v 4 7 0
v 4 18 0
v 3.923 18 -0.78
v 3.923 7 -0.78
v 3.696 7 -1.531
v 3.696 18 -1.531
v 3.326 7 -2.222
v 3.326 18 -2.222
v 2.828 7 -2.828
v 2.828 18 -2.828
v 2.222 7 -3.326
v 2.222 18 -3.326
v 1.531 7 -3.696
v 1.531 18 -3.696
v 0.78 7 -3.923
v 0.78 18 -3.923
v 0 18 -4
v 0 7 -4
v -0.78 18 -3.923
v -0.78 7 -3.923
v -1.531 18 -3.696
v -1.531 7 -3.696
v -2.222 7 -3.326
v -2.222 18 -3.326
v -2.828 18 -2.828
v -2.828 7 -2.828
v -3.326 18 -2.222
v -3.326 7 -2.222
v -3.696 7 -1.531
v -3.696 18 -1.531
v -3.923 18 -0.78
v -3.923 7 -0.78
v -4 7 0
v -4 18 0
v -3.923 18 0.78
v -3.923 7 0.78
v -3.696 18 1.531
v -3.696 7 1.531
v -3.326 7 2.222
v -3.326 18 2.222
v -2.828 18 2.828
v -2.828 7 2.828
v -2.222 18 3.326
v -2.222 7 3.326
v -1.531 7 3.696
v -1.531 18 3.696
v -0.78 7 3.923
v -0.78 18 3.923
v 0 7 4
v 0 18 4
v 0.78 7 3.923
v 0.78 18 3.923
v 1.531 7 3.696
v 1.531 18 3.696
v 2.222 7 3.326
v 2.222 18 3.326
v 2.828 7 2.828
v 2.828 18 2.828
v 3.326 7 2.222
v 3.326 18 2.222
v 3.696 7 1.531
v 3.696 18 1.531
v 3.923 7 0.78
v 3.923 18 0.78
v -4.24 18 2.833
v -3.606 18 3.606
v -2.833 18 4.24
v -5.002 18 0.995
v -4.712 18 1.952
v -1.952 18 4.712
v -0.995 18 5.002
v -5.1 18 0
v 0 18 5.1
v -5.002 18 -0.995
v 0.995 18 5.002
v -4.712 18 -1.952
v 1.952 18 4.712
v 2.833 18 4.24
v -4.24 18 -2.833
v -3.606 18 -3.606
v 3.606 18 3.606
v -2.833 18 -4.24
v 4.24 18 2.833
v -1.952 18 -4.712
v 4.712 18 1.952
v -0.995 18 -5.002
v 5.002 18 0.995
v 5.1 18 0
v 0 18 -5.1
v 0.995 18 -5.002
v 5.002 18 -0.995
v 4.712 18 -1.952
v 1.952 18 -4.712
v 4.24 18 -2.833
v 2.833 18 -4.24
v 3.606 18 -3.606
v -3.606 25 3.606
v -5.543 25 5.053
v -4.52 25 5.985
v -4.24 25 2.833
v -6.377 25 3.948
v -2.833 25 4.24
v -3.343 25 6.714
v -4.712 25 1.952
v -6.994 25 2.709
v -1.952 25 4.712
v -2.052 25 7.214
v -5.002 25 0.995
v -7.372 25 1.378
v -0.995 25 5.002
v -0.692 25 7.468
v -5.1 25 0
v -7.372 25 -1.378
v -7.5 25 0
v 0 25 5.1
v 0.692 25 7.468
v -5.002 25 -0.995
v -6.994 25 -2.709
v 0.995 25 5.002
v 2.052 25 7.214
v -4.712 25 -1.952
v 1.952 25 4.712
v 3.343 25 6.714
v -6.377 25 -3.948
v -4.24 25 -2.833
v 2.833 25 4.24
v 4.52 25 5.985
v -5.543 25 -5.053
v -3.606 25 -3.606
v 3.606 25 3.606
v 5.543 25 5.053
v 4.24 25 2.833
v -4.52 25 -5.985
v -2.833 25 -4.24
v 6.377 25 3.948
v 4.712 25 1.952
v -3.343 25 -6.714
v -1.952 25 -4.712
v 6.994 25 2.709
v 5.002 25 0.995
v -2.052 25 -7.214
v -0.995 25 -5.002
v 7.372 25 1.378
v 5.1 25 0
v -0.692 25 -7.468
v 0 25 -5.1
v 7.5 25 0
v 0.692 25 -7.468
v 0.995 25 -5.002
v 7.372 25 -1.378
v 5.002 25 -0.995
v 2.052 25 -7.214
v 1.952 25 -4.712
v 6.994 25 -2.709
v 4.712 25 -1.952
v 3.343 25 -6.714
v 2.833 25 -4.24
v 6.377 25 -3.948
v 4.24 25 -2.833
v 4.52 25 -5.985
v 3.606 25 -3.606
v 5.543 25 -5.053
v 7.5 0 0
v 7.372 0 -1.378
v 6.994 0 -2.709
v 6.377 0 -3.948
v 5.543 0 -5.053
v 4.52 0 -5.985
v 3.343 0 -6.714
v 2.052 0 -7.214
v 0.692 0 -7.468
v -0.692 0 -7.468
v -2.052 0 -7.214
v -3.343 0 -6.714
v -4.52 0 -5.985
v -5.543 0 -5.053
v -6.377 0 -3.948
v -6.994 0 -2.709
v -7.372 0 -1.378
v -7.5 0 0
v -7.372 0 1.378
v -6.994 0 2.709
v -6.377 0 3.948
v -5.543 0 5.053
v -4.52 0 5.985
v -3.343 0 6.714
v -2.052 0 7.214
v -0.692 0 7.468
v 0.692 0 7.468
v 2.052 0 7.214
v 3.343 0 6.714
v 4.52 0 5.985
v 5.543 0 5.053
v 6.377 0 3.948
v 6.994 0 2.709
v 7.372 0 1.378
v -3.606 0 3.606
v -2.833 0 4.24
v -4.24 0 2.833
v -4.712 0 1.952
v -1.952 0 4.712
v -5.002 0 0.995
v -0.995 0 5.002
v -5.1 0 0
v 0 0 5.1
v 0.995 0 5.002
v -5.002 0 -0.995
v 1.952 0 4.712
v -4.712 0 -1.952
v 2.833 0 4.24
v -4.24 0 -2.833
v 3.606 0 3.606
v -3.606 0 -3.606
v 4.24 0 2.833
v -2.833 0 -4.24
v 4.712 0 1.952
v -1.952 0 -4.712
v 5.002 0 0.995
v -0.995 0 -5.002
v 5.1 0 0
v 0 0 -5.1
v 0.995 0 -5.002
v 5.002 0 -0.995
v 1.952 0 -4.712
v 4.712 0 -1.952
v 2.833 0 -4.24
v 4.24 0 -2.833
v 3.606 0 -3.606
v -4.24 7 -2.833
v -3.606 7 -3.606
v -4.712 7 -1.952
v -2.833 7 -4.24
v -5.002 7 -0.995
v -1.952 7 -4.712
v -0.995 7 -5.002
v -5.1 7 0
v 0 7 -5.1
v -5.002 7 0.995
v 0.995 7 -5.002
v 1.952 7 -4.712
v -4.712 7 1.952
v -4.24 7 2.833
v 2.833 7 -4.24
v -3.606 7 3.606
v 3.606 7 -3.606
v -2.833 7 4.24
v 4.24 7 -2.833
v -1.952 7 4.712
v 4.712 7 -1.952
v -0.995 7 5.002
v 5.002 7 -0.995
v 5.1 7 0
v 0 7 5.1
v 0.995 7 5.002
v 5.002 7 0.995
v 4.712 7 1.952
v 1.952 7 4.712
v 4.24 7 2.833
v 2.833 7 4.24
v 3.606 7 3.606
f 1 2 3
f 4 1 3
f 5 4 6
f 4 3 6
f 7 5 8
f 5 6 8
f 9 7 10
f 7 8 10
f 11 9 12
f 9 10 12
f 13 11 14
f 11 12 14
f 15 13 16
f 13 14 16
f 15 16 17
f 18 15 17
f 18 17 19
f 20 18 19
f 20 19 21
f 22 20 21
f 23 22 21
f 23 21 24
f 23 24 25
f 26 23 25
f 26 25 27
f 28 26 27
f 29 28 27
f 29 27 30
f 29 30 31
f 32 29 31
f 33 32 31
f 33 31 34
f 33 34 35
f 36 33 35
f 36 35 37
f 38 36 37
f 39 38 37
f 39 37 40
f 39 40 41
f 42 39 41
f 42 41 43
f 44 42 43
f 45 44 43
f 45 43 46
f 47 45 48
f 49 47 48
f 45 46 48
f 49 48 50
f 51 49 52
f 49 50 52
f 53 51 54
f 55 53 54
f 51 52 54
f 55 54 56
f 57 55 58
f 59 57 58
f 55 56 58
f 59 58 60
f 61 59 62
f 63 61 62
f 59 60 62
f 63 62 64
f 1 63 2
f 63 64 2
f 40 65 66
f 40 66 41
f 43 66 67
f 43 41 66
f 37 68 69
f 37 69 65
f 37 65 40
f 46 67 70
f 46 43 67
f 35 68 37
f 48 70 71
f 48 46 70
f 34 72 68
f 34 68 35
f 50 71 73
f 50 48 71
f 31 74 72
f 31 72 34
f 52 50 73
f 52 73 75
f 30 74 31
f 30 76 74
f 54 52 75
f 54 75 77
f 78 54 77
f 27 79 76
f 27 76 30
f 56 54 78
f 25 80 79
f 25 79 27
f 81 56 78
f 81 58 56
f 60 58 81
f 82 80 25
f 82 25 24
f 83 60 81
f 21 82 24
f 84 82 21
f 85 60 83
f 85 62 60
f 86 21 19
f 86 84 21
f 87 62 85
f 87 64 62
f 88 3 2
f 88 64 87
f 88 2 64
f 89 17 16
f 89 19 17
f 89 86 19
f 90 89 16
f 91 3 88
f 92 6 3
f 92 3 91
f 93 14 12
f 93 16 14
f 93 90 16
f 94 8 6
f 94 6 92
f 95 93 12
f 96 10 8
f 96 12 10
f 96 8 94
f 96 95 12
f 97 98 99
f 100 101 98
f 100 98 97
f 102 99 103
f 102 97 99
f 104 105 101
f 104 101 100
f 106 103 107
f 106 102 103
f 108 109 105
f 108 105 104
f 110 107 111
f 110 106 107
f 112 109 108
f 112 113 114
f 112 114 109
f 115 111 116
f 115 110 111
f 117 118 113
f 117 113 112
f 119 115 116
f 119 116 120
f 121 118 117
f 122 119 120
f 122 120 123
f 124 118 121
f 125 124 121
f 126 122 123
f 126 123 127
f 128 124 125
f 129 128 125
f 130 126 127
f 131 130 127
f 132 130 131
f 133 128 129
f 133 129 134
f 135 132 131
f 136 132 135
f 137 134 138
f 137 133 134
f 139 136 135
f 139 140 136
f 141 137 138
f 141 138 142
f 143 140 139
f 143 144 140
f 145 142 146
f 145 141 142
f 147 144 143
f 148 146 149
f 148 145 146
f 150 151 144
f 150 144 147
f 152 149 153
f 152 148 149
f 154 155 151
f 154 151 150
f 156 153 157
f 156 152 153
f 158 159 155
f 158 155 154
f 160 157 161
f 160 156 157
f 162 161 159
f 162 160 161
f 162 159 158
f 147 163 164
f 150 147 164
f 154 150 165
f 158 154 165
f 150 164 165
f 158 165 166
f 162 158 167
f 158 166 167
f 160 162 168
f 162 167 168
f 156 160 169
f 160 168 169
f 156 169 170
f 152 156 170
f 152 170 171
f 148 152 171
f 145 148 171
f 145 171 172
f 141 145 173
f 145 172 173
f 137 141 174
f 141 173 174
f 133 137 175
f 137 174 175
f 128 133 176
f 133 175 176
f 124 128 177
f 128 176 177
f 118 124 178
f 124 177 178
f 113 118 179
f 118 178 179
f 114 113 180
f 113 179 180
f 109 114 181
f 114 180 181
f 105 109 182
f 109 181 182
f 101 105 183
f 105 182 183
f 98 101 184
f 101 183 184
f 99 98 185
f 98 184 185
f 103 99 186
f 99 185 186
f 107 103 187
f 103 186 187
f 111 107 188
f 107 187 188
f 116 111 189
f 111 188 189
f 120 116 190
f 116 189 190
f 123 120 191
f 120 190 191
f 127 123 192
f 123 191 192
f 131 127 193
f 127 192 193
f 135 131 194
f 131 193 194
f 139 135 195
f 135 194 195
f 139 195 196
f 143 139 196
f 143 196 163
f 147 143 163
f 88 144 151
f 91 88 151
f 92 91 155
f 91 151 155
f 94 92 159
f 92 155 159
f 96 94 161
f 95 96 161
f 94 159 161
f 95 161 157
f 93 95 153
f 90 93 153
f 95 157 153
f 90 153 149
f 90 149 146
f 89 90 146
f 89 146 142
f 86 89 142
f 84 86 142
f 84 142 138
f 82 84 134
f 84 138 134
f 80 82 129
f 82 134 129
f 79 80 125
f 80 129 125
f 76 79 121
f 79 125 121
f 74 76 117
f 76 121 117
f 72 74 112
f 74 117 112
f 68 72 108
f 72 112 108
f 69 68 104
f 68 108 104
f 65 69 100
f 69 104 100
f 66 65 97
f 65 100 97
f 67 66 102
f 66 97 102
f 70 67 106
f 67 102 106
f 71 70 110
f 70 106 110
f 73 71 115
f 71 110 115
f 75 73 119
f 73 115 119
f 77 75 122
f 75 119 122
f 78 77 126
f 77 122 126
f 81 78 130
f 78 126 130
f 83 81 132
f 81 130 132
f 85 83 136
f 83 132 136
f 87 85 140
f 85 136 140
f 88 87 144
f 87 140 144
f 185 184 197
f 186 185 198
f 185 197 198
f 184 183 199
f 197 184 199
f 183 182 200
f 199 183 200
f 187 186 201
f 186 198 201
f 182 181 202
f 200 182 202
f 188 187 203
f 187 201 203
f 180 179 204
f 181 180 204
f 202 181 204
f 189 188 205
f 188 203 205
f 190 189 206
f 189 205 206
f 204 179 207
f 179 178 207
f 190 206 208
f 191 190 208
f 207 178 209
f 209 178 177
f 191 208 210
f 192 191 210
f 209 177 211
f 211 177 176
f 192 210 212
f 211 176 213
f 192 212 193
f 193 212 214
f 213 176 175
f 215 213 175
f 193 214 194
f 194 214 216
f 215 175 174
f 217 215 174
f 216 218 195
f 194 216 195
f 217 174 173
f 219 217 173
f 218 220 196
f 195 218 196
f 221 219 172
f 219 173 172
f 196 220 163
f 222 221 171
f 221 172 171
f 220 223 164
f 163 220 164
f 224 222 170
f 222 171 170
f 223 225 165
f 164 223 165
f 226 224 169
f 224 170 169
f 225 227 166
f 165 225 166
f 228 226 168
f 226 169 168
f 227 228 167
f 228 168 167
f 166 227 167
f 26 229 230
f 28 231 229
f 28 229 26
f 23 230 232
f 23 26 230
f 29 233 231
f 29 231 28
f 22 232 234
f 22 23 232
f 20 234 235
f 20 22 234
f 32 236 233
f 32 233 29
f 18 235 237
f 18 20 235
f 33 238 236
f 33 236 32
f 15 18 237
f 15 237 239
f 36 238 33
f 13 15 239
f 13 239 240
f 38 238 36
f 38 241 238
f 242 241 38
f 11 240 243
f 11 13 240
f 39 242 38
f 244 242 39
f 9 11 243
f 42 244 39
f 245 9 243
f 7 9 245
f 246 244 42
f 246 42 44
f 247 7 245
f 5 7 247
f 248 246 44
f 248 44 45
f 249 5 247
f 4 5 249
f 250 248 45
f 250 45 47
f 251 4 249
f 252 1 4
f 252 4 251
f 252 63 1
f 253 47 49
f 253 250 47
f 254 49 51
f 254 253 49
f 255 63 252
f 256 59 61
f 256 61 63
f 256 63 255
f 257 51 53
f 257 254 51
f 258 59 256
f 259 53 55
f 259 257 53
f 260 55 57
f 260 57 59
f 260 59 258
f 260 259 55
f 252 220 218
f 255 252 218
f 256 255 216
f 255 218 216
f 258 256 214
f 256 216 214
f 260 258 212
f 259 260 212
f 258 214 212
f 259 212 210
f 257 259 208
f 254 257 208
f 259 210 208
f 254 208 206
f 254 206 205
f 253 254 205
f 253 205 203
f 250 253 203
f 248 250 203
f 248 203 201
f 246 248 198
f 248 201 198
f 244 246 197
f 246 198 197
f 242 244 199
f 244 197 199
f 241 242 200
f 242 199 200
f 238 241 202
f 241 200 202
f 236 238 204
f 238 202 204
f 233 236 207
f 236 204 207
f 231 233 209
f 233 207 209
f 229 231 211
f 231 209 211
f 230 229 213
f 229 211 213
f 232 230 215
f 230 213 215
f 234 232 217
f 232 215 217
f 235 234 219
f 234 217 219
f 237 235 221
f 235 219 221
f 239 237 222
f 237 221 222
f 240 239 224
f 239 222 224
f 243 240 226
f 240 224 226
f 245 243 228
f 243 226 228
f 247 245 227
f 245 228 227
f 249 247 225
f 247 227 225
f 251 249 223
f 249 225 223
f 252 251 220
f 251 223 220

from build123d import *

# Parameters (mm, degrees)
SKETCH1_R           = 7.5
BOSS_EXTRUDE1_DEPTH = 25
SKETCH2_R           = 5.1
CUT_EXTRUDE1_DEPTH  = 7
SKETCH3_R           = 5.1
CUT_EXTRUDE2_DEPTH  = 7
SKETCH4_R           = 4
CUT_EXTRUDE3_DEPTH  = 19


with BuildPart() as part:
    # Sketch1 → Boss-Extrude1 (new body)
    with BuildSketch(Plane(origin=(0, 0, 0), x_dir=(1, 0, 0), z_dir=(0, 1, 0))):
        Circle(SKETCH1_R)
    extrude(amount=BOSS_EXTRUDE1_DEPTH)

    # Sketch2 → Cut-Extrude1 (cut)
    with BuildSketch(Plane.XZ):
        Circle(SKETCH2_R)
    extrude(amount=-CUT_EXTRUDE1_DEPTH, mode=Mode.SUBTRACT)

    # Sketch3 → Cut-Extrude2 (cut)
    with BuildSketch(Plane(origin=(0, 25, 0), x_dir=(1, 0, 0), z_dir=(0, 1, 0))):
        Circle(SKETCH3_R)
    extrude(amount=-CUT_EXTRUDE2_DEPTH, mode=Mode.SUBTRACT)

    # Sketch4 → Cut-Extrude3 (cut, through all)
    with BuildSketch(Plane(origin=(0, 18, 0), x_dir=(1, 0, 0), z_dir=(0, 1, 0))):
        Circle(SKETCH4_R)
    extrude(amount=-CUT_EXTRUDE3_DEPTH, mode=Mode.SUBTRACT)


solid = part.part
